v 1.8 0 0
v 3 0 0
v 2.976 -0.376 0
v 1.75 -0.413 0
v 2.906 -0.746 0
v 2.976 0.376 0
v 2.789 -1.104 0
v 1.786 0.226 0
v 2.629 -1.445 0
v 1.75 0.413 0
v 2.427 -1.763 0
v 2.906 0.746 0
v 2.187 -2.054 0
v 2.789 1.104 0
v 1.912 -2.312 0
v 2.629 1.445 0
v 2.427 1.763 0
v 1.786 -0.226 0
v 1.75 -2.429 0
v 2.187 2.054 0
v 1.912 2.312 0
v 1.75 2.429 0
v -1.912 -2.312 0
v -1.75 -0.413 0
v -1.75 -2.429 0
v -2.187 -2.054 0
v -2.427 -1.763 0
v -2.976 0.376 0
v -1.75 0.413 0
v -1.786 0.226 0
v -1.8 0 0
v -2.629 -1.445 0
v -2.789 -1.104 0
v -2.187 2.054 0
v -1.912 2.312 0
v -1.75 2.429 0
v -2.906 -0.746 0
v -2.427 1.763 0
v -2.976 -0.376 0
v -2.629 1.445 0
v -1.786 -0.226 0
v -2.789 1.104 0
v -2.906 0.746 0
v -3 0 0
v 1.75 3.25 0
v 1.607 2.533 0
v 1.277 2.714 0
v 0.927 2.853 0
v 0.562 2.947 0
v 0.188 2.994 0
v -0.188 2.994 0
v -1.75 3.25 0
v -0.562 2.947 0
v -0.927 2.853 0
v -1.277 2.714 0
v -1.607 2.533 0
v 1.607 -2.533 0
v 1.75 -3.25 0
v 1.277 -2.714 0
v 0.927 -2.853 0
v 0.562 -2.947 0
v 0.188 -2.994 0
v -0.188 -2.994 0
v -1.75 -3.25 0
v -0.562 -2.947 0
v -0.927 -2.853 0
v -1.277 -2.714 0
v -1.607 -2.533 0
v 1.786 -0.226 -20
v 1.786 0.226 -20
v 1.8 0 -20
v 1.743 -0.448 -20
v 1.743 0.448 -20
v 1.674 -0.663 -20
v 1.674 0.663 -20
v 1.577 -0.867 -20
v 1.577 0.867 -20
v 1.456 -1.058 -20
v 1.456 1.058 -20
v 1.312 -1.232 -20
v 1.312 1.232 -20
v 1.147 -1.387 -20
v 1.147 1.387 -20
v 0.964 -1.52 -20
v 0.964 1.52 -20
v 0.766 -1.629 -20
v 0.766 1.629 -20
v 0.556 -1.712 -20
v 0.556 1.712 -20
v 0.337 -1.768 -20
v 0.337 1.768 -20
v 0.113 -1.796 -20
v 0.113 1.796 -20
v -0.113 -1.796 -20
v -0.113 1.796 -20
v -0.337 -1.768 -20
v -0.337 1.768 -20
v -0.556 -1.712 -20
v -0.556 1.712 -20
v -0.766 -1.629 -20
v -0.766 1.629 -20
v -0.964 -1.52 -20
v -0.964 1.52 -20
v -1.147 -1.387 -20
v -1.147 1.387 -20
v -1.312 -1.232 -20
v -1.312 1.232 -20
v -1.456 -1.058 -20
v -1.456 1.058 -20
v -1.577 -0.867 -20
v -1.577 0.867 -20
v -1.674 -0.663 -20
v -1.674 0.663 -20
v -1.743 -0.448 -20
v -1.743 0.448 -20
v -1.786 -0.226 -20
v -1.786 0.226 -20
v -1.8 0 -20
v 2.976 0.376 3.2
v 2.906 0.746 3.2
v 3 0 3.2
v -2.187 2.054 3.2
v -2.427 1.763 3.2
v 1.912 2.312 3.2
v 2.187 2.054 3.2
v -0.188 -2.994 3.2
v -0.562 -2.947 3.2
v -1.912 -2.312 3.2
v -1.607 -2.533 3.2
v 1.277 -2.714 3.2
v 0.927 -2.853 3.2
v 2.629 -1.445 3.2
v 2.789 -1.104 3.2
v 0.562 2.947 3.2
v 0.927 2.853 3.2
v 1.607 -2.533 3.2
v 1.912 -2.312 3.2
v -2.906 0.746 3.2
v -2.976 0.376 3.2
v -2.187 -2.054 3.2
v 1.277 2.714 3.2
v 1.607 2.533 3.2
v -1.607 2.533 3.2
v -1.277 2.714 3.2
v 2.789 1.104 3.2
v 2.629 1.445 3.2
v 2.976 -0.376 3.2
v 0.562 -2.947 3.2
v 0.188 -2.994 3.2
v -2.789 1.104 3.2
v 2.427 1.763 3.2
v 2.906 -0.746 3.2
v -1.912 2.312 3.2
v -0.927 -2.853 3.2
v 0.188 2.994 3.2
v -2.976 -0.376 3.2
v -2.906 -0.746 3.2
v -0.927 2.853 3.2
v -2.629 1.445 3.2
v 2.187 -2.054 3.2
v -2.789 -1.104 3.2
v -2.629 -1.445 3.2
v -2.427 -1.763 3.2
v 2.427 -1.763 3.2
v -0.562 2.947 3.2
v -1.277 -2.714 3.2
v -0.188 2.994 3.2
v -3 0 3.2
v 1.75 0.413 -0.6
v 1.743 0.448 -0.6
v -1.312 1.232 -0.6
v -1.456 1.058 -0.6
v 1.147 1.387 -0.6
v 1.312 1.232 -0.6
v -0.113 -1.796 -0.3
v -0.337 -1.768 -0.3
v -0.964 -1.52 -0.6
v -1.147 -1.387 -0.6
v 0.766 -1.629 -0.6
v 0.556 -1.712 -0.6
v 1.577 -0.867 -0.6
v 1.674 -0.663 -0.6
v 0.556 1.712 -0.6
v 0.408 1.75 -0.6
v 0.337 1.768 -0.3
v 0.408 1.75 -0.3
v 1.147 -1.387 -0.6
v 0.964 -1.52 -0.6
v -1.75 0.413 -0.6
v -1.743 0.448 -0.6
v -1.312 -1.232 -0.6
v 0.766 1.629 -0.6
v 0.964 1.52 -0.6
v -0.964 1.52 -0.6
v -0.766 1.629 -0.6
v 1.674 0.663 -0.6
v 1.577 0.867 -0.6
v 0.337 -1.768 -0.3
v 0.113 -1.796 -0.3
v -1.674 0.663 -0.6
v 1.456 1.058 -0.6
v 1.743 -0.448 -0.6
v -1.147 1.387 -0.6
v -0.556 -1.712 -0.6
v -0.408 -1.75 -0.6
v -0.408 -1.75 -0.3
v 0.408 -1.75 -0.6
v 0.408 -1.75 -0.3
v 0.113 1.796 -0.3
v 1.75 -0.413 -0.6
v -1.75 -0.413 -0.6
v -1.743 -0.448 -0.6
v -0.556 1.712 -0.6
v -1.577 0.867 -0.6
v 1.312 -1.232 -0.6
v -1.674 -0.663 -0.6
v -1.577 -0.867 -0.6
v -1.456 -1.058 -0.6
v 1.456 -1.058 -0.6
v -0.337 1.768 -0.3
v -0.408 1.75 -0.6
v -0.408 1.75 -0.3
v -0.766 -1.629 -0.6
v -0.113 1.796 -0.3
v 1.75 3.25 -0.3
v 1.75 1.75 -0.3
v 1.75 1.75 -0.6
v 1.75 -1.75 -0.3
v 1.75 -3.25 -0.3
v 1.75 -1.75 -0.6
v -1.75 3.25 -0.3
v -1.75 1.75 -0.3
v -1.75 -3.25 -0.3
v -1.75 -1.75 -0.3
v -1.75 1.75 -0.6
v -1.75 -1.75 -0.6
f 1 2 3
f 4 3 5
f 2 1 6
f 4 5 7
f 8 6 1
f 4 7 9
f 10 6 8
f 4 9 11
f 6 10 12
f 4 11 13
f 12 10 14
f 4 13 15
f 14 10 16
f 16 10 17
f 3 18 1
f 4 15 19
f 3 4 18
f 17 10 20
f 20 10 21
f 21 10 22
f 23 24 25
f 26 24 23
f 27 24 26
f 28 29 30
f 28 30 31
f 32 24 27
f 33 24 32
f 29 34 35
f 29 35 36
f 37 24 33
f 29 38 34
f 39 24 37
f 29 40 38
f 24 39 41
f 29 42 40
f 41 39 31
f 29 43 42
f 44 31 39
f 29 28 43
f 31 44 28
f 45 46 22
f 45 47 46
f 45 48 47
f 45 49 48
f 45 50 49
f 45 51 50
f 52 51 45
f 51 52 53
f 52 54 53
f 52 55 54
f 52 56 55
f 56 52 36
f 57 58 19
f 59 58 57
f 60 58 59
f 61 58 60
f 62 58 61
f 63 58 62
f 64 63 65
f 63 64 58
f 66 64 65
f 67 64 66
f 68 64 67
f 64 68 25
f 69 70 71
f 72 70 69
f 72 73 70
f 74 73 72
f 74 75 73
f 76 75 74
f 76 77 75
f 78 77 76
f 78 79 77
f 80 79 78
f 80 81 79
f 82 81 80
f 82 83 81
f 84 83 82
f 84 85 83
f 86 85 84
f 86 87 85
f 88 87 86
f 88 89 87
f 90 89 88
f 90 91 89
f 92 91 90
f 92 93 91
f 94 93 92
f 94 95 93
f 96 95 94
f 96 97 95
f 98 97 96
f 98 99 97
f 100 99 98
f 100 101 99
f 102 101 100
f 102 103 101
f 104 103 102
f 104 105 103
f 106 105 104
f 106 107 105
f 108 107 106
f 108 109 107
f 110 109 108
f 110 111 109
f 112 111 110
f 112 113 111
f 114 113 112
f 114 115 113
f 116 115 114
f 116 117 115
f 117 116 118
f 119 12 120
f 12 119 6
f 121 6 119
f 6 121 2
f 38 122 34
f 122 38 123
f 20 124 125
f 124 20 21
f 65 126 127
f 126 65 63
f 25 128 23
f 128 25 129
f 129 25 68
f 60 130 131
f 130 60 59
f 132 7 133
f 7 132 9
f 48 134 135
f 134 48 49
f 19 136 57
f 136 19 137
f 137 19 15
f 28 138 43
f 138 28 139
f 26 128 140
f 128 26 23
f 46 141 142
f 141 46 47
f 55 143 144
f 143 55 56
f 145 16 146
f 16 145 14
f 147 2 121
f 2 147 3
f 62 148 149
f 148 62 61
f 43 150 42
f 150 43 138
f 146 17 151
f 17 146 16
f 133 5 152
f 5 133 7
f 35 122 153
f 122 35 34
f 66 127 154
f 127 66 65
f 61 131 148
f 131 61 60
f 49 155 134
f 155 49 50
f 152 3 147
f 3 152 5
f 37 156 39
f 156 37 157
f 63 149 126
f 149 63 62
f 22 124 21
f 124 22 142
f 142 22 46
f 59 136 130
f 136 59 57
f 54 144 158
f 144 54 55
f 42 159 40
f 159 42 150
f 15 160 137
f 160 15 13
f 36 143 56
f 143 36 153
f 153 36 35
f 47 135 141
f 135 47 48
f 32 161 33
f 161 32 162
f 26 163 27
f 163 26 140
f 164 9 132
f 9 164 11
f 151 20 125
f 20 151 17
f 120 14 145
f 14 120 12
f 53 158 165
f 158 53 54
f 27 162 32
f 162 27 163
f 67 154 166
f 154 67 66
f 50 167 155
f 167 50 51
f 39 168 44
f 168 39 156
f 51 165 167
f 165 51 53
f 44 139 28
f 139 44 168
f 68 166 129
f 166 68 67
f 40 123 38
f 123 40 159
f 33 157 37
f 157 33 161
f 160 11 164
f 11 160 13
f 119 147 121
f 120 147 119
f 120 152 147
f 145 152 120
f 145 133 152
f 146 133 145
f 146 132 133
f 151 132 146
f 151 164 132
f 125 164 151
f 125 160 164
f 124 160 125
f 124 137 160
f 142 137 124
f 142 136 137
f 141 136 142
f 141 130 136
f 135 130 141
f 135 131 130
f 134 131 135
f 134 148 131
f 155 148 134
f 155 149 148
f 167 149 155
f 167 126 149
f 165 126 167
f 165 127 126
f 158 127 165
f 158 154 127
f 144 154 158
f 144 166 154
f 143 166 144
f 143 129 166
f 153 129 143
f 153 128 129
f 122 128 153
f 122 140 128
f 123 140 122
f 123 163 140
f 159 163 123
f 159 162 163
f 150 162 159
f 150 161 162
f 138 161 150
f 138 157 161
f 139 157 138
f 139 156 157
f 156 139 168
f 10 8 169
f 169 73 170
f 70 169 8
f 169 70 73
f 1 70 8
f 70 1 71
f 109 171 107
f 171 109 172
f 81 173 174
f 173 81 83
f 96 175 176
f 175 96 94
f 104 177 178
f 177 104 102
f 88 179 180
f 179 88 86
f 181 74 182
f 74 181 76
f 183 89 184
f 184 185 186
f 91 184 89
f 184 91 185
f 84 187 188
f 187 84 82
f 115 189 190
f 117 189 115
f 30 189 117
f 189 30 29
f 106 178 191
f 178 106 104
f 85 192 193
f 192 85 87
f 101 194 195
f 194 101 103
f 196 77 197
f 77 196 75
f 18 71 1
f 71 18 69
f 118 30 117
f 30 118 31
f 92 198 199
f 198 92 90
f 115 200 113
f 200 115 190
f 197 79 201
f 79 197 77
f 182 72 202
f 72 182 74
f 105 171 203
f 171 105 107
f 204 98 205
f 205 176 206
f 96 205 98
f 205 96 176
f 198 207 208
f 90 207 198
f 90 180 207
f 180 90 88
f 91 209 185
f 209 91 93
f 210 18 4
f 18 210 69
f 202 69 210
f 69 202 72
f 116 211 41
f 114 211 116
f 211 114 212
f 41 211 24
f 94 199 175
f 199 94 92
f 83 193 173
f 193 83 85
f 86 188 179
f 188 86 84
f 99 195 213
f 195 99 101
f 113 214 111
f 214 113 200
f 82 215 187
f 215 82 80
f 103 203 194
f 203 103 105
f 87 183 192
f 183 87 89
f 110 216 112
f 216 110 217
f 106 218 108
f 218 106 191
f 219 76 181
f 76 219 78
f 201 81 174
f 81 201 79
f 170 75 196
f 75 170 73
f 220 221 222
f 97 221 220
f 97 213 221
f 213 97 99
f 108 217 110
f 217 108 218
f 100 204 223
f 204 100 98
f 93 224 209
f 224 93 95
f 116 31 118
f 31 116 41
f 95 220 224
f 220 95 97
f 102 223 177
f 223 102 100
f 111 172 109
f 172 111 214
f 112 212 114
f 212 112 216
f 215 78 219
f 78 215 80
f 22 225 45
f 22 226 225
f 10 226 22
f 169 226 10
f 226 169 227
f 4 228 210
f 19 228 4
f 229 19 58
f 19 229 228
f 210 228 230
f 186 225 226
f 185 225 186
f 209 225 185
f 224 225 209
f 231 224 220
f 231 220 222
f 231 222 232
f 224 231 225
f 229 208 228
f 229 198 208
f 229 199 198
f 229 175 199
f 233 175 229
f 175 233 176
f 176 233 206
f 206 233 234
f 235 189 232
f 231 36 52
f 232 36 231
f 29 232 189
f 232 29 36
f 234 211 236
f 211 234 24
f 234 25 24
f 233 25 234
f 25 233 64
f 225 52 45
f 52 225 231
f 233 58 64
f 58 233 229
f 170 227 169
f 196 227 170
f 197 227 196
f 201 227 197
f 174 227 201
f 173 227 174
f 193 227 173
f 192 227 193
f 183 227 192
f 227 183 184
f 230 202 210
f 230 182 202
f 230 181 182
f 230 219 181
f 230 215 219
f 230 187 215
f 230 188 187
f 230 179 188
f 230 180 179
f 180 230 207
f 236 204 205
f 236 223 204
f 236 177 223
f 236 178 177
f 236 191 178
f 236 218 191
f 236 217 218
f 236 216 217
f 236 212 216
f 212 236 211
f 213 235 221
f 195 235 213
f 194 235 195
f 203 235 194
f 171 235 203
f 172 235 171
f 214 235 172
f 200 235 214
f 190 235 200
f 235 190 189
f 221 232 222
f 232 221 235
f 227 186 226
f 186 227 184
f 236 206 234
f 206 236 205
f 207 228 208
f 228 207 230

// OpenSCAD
$fn = 50;


difference() {
	union() {
		translate(v = [0, 0, 0]) {
			rotate(a = [0, 0, 0]) {
				difference() {
					union() {
						translate(v = [0, 0, -20.0000000000]) {
							cylinder(h = 20, r = 1.5000000000);
						}
						cylinder(h = 3.2000000000, r = 3.0000000000);
						translate(v = [0, 0, -20.0000000000]) {
							cylinder(h = 20, r = 1.8000000000);
						}
						translate(v = [-1.7500000000, -3.2500000000, -0.3000000000]) {
							cube(size = [3.5000000000, 6.5000000000, 0.3000000000]);
						}
						translate(v = [-1.7500000000, -1.7500000000, -0.6000000000]) {
							cube(size = [3.5000000000, 3.5000000000, 0.3000000000]);
						}
						translate(v = [0, 0, -20.0000000000]) {
							cylinder(h = 20, r = 1.5000000000);
						}
					}
					union();
				}
			}
		}
	}
	union();
}
